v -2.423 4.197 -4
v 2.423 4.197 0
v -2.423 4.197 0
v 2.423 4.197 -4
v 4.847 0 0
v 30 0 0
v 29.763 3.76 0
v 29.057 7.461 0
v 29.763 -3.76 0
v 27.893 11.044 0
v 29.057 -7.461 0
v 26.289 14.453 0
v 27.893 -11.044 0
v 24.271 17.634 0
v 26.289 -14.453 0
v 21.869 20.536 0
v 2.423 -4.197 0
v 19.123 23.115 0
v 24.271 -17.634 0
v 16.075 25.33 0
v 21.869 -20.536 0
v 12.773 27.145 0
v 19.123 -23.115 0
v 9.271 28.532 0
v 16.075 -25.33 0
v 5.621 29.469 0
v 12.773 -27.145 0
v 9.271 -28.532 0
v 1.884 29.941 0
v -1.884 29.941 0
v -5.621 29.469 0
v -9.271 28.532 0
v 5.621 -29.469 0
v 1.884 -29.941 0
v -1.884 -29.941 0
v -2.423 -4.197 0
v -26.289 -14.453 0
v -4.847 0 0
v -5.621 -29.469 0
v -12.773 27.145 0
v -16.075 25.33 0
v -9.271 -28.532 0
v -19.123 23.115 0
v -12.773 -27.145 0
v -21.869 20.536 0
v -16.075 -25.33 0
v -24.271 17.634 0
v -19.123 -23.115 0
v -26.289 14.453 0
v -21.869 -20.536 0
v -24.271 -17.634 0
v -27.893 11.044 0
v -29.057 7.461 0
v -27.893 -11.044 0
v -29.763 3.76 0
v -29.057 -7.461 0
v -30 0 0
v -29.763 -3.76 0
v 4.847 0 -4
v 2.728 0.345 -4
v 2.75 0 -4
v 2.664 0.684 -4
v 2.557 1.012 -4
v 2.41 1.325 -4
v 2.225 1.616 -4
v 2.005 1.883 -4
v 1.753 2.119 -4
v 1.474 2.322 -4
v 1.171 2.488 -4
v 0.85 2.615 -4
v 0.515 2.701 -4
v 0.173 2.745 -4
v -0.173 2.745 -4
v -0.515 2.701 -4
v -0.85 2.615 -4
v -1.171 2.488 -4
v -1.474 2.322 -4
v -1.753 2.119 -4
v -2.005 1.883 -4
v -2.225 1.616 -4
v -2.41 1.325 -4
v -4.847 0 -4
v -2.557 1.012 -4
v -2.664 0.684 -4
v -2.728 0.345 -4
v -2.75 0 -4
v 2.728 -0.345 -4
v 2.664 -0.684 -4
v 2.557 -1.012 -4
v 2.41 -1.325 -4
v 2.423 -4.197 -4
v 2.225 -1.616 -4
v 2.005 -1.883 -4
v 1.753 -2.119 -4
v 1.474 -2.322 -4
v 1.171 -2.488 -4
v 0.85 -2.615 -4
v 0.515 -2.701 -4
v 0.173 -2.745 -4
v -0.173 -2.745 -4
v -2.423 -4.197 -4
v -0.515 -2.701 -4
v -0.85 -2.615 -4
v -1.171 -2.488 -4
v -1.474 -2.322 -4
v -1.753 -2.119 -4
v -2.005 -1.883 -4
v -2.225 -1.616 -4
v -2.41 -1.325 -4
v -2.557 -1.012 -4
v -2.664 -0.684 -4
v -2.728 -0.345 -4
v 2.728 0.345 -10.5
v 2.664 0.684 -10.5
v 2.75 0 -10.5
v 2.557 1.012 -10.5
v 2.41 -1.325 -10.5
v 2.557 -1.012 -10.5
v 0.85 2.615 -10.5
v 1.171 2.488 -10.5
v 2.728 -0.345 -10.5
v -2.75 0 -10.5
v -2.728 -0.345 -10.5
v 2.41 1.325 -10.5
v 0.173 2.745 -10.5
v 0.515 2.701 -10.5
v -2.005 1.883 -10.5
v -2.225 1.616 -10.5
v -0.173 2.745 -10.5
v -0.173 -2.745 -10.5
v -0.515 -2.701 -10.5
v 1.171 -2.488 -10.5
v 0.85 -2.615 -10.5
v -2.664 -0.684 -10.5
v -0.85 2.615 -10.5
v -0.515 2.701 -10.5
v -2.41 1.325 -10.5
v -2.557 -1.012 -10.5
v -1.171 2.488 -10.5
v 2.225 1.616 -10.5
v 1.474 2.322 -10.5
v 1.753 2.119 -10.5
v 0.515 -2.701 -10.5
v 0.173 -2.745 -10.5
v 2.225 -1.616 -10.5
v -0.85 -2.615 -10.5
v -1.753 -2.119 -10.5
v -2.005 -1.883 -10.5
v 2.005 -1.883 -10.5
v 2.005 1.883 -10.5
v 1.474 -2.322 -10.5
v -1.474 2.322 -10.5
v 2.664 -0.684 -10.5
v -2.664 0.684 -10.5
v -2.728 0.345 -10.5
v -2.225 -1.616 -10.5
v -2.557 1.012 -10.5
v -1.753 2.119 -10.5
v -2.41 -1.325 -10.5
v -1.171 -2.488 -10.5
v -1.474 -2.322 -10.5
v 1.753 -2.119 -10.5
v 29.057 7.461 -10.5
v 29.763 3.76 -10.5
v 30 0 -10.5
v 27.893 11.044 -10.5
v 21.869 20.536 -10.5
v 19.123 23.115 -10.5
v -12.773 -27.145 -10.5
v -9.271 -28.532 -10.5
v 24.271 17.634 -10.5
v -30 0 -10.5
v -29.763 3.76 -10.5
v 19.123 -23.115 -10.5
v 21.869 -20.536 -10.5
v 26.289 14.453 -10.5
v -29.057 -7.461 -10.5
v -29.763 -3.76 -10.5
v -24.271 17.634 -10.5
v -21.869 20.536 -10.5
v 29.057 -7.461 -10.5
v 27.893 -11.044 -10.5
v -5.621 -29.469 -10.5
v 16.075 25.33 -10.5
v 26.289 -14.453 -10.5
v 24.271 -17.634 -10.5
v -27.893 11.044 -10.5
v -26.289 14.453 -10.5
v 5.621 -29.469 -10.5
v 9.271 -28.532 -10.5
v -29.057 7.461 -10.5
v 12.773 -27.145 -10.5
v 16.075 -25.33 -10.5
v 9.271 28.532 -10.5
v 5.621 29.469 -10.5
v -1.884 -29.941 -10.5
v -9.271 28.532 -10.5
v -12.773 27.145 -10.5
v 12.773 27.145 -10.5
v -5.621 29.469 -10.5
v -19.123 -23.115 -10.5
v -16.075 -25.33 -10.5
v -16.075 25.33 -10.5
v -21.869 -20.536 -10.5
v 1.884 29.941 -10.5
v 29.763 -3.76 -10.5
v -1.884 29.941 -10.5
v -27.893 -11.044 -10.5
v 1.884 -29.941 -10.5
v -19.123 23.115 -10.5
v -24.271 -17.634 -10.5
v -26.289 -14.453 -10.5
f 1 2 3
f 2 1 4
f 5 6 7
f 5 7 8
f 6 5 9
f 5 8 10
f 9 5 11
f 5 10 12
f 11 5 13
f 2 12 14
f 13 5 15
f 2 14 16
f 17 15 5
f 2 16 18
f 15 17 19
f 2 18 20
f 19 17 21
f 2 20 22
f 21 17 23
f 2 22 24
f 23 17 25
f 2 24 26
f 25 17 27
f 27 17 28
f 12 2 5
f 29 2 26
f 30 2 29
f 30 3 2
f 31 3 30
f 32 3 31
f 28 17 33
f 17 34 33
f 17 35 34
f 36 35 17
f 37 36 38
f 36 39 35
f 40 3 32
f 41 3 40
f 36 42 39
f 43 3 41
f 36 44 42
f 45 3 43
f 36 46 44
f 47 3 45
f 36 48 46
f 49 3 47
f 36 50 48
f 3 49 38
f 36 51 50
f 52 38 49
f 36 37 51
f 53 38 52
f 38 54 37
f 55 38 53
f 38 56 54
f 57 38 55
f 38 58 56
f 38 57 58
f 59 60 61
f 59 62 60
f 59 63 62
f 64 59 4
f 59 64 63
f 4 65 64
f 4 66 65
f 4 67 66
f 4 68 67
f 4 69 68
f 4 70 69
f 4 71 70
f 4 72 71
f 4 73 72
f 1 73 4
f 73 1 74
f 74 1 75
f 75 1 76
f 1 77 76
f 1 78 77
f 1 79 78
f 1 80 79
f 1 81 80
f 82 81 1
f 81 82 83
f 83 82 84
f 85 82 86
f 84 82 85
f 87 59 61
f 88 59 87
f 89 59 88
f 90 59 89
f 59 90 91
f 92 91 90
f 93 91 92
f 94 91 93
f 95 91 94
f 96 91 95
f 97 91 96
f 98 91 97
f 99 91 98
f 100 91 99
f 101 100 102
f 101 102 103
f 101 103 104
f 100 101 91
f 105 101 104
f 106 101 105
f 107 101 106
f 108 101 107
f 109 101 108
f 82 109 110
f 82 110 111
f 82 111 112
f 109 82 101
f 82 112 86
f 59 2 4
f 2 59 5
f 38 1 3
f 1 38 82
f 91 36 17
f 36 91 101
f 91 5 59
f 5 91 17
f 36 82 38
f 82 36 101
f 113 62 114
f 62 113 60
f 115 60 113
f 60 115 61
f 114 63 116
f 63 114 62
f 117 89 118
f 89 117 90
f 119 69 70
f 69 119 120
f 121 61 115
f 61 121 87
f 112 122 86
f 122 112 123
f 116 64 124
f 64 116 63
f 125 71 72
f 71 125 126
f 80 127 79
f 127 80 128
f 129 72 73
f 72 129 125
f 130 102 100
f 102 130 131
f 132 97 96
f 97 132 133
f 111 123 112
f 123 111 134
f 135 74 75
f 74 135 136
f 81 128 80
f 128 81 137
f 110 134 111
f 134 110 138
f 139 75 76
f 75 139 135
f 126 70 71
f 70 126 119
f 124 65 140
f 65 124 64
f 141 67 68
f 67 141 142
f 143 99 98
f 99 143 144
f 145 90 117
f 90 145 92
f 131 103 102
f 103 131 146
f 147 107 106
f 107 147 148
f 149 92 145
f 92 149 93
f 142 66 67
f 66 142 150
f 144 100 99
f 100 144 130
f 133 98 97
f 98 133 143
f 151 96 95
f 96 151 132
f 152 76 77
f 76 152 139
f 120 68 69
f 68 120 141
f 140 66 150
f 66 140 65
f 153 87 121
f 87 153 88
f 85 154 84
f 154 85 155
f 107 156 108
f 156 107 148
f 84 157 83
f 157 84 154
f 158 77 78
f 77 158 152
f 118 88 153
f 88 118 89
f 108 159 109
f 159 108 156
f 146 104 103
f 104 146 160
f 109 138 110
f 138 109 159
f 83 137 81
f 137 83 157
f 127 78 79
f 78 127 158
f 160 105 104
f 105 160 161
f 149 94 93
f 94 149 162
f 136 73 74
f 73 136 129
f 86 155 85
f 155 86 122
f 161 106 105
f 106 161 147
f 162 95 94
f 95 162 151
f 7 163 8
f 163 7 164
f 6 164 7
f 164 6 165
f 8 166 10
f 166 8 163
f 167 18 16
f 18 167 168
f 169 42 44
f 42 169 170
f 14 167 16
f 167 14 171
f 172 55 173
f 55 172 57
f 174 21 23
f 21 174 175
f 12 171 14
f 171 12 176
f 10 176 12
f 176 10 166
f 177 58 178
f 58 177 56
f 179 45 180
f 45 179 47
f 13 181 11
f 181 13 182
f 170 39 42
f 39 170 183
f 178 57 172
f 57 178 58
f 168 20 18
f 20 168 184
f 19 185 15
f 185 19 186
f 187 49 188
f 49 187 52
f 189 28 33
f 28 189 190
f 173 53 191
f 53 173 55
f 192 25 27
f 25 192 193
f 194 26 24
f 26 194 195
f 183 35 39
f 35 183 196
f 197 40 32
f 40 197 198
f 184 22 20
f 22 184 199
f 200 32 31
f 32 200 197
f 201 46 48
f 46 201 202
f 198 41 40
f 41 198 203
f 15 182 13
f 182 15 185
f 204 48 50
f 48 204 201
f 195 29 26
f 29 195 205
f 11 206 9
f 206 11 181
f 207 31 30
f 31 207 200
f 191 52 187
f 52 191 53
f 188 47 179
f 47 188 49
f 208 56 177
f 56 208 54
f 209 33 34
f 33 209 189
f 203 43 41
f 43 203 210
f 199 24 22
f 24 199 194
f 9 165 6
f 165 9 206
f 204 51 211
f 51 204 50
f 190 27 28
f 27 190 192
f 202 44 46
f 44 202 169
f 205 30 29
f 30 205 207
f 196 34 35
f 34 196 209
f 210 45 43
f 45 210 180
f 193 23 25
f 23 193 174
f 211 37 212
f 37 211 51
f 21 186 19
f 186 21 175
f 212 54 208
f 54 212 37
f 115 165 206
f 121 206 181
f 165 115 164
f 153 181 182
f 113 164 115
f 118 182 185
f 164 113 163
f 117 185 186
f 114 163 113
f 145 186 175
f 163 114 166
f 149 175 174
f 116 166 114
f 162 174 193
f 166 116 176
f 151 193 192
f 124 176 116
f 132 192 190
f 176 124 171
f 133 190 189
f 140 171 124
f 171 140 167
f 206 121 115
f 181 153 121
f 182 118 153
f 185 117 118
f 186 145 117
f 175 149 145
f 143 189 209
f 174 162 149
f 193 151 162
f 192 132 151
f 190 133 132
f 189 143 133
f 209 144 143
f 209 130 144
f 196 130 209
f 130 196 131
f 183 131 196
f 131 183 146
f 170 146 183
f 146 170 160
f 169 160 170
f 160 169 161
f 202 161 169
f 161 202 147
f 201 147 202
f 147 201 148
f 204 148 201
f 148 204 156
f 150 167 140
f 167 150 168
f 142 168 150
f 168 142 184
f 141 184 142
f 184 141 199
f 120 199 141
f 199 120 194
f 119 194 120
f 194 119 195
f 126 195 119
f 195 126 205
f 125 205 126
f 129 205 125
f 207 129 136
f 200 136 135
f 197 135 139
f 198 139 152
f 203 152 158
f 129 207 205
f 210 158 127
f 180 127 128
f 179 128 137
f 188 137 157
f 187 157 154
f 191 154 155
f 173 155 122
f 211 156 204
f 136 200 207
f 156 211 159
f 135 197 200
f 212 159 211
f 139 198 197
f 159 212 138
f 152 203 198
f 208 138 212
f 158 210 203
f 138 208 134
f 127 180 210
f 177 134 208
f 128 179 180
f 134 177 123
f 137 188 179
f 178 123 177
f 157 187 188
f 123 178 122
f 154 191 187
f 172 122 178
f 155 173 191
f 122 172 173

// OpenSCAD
$fn = 50;

difference() {
	union() {
		translate(v = [0, 0, -10.5]) {
			cylinder(h = 10.5, r = 30.0);
		}
	}
	union() {
		translate(v = [0, 0, 0]) {
			rotate(a = [0, 0, 0]) {
				difference() {
					union() {
						translate(v = [0, 0, -4]) {
							linear_extrude(height = 4) {
								polygon(points = [[4.8468, 0.0], [2.4234000000000004, 4.197451927062417], [-2.423399999999999, 4.197451927062417], [-4.8468, 5.935618106107392e-16], [-2.423400000000002, -4.197451927062416], [2.423399999999997, -4.197451927062419]]);
							}
						}
					}
					union();
				}
			}
		}
		#translate(v = [0, 0, -100.0]) {
			cylinder(h = 200, r = 2.75);
		}
	}
}
